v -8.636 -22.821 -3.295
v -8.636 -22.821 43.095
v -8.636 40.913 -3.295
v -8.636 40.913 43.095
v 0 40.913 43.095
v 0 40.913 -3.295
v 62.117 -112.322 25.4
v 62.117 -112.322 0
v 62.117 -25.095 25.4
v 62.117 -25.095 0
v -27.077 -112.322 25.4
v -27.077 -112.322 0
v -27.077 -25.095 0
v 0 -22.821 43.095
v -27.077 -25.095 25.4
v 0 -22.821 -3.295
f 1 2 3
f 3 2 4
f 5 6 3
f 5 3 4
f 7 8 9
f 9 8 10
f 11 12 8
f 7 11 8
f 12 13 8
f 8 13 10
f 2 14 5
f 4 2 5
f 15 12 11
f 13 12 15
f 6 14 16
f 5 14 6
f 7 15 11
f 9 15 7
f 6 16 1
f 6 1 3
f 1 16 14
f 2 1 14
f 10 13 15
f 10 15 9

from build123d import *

# Parameters (mm, degrees)
F0_W     = 89.19398
F0_H     = 87.227009
F1_DEPTH = 25.4
F2_W     = 63.7346
F2_H     = 46.390337
F3_DEPTH = 8.636


with BuildPart() as f1:
    # F0 (on Top) → F1 (new body)
    with BuildSketch(Plane.XY):
        with Locations((17.520423, -68.708483)):
            Rectangle(F0_W, F0_H)
    extrude(amount=F1_DEPTH)


with BuildPart() as f3:
    # F2 (on Right) → F3 (new body)
    with BuildSketch(Plane.YZ):
        with Locations((9.045969, 19.900021)):
            Rectangle(F2_W, F2_H)
    extrude(amount=-F3_DEPTH)


solid = Compound([f1.part, f3.part])
